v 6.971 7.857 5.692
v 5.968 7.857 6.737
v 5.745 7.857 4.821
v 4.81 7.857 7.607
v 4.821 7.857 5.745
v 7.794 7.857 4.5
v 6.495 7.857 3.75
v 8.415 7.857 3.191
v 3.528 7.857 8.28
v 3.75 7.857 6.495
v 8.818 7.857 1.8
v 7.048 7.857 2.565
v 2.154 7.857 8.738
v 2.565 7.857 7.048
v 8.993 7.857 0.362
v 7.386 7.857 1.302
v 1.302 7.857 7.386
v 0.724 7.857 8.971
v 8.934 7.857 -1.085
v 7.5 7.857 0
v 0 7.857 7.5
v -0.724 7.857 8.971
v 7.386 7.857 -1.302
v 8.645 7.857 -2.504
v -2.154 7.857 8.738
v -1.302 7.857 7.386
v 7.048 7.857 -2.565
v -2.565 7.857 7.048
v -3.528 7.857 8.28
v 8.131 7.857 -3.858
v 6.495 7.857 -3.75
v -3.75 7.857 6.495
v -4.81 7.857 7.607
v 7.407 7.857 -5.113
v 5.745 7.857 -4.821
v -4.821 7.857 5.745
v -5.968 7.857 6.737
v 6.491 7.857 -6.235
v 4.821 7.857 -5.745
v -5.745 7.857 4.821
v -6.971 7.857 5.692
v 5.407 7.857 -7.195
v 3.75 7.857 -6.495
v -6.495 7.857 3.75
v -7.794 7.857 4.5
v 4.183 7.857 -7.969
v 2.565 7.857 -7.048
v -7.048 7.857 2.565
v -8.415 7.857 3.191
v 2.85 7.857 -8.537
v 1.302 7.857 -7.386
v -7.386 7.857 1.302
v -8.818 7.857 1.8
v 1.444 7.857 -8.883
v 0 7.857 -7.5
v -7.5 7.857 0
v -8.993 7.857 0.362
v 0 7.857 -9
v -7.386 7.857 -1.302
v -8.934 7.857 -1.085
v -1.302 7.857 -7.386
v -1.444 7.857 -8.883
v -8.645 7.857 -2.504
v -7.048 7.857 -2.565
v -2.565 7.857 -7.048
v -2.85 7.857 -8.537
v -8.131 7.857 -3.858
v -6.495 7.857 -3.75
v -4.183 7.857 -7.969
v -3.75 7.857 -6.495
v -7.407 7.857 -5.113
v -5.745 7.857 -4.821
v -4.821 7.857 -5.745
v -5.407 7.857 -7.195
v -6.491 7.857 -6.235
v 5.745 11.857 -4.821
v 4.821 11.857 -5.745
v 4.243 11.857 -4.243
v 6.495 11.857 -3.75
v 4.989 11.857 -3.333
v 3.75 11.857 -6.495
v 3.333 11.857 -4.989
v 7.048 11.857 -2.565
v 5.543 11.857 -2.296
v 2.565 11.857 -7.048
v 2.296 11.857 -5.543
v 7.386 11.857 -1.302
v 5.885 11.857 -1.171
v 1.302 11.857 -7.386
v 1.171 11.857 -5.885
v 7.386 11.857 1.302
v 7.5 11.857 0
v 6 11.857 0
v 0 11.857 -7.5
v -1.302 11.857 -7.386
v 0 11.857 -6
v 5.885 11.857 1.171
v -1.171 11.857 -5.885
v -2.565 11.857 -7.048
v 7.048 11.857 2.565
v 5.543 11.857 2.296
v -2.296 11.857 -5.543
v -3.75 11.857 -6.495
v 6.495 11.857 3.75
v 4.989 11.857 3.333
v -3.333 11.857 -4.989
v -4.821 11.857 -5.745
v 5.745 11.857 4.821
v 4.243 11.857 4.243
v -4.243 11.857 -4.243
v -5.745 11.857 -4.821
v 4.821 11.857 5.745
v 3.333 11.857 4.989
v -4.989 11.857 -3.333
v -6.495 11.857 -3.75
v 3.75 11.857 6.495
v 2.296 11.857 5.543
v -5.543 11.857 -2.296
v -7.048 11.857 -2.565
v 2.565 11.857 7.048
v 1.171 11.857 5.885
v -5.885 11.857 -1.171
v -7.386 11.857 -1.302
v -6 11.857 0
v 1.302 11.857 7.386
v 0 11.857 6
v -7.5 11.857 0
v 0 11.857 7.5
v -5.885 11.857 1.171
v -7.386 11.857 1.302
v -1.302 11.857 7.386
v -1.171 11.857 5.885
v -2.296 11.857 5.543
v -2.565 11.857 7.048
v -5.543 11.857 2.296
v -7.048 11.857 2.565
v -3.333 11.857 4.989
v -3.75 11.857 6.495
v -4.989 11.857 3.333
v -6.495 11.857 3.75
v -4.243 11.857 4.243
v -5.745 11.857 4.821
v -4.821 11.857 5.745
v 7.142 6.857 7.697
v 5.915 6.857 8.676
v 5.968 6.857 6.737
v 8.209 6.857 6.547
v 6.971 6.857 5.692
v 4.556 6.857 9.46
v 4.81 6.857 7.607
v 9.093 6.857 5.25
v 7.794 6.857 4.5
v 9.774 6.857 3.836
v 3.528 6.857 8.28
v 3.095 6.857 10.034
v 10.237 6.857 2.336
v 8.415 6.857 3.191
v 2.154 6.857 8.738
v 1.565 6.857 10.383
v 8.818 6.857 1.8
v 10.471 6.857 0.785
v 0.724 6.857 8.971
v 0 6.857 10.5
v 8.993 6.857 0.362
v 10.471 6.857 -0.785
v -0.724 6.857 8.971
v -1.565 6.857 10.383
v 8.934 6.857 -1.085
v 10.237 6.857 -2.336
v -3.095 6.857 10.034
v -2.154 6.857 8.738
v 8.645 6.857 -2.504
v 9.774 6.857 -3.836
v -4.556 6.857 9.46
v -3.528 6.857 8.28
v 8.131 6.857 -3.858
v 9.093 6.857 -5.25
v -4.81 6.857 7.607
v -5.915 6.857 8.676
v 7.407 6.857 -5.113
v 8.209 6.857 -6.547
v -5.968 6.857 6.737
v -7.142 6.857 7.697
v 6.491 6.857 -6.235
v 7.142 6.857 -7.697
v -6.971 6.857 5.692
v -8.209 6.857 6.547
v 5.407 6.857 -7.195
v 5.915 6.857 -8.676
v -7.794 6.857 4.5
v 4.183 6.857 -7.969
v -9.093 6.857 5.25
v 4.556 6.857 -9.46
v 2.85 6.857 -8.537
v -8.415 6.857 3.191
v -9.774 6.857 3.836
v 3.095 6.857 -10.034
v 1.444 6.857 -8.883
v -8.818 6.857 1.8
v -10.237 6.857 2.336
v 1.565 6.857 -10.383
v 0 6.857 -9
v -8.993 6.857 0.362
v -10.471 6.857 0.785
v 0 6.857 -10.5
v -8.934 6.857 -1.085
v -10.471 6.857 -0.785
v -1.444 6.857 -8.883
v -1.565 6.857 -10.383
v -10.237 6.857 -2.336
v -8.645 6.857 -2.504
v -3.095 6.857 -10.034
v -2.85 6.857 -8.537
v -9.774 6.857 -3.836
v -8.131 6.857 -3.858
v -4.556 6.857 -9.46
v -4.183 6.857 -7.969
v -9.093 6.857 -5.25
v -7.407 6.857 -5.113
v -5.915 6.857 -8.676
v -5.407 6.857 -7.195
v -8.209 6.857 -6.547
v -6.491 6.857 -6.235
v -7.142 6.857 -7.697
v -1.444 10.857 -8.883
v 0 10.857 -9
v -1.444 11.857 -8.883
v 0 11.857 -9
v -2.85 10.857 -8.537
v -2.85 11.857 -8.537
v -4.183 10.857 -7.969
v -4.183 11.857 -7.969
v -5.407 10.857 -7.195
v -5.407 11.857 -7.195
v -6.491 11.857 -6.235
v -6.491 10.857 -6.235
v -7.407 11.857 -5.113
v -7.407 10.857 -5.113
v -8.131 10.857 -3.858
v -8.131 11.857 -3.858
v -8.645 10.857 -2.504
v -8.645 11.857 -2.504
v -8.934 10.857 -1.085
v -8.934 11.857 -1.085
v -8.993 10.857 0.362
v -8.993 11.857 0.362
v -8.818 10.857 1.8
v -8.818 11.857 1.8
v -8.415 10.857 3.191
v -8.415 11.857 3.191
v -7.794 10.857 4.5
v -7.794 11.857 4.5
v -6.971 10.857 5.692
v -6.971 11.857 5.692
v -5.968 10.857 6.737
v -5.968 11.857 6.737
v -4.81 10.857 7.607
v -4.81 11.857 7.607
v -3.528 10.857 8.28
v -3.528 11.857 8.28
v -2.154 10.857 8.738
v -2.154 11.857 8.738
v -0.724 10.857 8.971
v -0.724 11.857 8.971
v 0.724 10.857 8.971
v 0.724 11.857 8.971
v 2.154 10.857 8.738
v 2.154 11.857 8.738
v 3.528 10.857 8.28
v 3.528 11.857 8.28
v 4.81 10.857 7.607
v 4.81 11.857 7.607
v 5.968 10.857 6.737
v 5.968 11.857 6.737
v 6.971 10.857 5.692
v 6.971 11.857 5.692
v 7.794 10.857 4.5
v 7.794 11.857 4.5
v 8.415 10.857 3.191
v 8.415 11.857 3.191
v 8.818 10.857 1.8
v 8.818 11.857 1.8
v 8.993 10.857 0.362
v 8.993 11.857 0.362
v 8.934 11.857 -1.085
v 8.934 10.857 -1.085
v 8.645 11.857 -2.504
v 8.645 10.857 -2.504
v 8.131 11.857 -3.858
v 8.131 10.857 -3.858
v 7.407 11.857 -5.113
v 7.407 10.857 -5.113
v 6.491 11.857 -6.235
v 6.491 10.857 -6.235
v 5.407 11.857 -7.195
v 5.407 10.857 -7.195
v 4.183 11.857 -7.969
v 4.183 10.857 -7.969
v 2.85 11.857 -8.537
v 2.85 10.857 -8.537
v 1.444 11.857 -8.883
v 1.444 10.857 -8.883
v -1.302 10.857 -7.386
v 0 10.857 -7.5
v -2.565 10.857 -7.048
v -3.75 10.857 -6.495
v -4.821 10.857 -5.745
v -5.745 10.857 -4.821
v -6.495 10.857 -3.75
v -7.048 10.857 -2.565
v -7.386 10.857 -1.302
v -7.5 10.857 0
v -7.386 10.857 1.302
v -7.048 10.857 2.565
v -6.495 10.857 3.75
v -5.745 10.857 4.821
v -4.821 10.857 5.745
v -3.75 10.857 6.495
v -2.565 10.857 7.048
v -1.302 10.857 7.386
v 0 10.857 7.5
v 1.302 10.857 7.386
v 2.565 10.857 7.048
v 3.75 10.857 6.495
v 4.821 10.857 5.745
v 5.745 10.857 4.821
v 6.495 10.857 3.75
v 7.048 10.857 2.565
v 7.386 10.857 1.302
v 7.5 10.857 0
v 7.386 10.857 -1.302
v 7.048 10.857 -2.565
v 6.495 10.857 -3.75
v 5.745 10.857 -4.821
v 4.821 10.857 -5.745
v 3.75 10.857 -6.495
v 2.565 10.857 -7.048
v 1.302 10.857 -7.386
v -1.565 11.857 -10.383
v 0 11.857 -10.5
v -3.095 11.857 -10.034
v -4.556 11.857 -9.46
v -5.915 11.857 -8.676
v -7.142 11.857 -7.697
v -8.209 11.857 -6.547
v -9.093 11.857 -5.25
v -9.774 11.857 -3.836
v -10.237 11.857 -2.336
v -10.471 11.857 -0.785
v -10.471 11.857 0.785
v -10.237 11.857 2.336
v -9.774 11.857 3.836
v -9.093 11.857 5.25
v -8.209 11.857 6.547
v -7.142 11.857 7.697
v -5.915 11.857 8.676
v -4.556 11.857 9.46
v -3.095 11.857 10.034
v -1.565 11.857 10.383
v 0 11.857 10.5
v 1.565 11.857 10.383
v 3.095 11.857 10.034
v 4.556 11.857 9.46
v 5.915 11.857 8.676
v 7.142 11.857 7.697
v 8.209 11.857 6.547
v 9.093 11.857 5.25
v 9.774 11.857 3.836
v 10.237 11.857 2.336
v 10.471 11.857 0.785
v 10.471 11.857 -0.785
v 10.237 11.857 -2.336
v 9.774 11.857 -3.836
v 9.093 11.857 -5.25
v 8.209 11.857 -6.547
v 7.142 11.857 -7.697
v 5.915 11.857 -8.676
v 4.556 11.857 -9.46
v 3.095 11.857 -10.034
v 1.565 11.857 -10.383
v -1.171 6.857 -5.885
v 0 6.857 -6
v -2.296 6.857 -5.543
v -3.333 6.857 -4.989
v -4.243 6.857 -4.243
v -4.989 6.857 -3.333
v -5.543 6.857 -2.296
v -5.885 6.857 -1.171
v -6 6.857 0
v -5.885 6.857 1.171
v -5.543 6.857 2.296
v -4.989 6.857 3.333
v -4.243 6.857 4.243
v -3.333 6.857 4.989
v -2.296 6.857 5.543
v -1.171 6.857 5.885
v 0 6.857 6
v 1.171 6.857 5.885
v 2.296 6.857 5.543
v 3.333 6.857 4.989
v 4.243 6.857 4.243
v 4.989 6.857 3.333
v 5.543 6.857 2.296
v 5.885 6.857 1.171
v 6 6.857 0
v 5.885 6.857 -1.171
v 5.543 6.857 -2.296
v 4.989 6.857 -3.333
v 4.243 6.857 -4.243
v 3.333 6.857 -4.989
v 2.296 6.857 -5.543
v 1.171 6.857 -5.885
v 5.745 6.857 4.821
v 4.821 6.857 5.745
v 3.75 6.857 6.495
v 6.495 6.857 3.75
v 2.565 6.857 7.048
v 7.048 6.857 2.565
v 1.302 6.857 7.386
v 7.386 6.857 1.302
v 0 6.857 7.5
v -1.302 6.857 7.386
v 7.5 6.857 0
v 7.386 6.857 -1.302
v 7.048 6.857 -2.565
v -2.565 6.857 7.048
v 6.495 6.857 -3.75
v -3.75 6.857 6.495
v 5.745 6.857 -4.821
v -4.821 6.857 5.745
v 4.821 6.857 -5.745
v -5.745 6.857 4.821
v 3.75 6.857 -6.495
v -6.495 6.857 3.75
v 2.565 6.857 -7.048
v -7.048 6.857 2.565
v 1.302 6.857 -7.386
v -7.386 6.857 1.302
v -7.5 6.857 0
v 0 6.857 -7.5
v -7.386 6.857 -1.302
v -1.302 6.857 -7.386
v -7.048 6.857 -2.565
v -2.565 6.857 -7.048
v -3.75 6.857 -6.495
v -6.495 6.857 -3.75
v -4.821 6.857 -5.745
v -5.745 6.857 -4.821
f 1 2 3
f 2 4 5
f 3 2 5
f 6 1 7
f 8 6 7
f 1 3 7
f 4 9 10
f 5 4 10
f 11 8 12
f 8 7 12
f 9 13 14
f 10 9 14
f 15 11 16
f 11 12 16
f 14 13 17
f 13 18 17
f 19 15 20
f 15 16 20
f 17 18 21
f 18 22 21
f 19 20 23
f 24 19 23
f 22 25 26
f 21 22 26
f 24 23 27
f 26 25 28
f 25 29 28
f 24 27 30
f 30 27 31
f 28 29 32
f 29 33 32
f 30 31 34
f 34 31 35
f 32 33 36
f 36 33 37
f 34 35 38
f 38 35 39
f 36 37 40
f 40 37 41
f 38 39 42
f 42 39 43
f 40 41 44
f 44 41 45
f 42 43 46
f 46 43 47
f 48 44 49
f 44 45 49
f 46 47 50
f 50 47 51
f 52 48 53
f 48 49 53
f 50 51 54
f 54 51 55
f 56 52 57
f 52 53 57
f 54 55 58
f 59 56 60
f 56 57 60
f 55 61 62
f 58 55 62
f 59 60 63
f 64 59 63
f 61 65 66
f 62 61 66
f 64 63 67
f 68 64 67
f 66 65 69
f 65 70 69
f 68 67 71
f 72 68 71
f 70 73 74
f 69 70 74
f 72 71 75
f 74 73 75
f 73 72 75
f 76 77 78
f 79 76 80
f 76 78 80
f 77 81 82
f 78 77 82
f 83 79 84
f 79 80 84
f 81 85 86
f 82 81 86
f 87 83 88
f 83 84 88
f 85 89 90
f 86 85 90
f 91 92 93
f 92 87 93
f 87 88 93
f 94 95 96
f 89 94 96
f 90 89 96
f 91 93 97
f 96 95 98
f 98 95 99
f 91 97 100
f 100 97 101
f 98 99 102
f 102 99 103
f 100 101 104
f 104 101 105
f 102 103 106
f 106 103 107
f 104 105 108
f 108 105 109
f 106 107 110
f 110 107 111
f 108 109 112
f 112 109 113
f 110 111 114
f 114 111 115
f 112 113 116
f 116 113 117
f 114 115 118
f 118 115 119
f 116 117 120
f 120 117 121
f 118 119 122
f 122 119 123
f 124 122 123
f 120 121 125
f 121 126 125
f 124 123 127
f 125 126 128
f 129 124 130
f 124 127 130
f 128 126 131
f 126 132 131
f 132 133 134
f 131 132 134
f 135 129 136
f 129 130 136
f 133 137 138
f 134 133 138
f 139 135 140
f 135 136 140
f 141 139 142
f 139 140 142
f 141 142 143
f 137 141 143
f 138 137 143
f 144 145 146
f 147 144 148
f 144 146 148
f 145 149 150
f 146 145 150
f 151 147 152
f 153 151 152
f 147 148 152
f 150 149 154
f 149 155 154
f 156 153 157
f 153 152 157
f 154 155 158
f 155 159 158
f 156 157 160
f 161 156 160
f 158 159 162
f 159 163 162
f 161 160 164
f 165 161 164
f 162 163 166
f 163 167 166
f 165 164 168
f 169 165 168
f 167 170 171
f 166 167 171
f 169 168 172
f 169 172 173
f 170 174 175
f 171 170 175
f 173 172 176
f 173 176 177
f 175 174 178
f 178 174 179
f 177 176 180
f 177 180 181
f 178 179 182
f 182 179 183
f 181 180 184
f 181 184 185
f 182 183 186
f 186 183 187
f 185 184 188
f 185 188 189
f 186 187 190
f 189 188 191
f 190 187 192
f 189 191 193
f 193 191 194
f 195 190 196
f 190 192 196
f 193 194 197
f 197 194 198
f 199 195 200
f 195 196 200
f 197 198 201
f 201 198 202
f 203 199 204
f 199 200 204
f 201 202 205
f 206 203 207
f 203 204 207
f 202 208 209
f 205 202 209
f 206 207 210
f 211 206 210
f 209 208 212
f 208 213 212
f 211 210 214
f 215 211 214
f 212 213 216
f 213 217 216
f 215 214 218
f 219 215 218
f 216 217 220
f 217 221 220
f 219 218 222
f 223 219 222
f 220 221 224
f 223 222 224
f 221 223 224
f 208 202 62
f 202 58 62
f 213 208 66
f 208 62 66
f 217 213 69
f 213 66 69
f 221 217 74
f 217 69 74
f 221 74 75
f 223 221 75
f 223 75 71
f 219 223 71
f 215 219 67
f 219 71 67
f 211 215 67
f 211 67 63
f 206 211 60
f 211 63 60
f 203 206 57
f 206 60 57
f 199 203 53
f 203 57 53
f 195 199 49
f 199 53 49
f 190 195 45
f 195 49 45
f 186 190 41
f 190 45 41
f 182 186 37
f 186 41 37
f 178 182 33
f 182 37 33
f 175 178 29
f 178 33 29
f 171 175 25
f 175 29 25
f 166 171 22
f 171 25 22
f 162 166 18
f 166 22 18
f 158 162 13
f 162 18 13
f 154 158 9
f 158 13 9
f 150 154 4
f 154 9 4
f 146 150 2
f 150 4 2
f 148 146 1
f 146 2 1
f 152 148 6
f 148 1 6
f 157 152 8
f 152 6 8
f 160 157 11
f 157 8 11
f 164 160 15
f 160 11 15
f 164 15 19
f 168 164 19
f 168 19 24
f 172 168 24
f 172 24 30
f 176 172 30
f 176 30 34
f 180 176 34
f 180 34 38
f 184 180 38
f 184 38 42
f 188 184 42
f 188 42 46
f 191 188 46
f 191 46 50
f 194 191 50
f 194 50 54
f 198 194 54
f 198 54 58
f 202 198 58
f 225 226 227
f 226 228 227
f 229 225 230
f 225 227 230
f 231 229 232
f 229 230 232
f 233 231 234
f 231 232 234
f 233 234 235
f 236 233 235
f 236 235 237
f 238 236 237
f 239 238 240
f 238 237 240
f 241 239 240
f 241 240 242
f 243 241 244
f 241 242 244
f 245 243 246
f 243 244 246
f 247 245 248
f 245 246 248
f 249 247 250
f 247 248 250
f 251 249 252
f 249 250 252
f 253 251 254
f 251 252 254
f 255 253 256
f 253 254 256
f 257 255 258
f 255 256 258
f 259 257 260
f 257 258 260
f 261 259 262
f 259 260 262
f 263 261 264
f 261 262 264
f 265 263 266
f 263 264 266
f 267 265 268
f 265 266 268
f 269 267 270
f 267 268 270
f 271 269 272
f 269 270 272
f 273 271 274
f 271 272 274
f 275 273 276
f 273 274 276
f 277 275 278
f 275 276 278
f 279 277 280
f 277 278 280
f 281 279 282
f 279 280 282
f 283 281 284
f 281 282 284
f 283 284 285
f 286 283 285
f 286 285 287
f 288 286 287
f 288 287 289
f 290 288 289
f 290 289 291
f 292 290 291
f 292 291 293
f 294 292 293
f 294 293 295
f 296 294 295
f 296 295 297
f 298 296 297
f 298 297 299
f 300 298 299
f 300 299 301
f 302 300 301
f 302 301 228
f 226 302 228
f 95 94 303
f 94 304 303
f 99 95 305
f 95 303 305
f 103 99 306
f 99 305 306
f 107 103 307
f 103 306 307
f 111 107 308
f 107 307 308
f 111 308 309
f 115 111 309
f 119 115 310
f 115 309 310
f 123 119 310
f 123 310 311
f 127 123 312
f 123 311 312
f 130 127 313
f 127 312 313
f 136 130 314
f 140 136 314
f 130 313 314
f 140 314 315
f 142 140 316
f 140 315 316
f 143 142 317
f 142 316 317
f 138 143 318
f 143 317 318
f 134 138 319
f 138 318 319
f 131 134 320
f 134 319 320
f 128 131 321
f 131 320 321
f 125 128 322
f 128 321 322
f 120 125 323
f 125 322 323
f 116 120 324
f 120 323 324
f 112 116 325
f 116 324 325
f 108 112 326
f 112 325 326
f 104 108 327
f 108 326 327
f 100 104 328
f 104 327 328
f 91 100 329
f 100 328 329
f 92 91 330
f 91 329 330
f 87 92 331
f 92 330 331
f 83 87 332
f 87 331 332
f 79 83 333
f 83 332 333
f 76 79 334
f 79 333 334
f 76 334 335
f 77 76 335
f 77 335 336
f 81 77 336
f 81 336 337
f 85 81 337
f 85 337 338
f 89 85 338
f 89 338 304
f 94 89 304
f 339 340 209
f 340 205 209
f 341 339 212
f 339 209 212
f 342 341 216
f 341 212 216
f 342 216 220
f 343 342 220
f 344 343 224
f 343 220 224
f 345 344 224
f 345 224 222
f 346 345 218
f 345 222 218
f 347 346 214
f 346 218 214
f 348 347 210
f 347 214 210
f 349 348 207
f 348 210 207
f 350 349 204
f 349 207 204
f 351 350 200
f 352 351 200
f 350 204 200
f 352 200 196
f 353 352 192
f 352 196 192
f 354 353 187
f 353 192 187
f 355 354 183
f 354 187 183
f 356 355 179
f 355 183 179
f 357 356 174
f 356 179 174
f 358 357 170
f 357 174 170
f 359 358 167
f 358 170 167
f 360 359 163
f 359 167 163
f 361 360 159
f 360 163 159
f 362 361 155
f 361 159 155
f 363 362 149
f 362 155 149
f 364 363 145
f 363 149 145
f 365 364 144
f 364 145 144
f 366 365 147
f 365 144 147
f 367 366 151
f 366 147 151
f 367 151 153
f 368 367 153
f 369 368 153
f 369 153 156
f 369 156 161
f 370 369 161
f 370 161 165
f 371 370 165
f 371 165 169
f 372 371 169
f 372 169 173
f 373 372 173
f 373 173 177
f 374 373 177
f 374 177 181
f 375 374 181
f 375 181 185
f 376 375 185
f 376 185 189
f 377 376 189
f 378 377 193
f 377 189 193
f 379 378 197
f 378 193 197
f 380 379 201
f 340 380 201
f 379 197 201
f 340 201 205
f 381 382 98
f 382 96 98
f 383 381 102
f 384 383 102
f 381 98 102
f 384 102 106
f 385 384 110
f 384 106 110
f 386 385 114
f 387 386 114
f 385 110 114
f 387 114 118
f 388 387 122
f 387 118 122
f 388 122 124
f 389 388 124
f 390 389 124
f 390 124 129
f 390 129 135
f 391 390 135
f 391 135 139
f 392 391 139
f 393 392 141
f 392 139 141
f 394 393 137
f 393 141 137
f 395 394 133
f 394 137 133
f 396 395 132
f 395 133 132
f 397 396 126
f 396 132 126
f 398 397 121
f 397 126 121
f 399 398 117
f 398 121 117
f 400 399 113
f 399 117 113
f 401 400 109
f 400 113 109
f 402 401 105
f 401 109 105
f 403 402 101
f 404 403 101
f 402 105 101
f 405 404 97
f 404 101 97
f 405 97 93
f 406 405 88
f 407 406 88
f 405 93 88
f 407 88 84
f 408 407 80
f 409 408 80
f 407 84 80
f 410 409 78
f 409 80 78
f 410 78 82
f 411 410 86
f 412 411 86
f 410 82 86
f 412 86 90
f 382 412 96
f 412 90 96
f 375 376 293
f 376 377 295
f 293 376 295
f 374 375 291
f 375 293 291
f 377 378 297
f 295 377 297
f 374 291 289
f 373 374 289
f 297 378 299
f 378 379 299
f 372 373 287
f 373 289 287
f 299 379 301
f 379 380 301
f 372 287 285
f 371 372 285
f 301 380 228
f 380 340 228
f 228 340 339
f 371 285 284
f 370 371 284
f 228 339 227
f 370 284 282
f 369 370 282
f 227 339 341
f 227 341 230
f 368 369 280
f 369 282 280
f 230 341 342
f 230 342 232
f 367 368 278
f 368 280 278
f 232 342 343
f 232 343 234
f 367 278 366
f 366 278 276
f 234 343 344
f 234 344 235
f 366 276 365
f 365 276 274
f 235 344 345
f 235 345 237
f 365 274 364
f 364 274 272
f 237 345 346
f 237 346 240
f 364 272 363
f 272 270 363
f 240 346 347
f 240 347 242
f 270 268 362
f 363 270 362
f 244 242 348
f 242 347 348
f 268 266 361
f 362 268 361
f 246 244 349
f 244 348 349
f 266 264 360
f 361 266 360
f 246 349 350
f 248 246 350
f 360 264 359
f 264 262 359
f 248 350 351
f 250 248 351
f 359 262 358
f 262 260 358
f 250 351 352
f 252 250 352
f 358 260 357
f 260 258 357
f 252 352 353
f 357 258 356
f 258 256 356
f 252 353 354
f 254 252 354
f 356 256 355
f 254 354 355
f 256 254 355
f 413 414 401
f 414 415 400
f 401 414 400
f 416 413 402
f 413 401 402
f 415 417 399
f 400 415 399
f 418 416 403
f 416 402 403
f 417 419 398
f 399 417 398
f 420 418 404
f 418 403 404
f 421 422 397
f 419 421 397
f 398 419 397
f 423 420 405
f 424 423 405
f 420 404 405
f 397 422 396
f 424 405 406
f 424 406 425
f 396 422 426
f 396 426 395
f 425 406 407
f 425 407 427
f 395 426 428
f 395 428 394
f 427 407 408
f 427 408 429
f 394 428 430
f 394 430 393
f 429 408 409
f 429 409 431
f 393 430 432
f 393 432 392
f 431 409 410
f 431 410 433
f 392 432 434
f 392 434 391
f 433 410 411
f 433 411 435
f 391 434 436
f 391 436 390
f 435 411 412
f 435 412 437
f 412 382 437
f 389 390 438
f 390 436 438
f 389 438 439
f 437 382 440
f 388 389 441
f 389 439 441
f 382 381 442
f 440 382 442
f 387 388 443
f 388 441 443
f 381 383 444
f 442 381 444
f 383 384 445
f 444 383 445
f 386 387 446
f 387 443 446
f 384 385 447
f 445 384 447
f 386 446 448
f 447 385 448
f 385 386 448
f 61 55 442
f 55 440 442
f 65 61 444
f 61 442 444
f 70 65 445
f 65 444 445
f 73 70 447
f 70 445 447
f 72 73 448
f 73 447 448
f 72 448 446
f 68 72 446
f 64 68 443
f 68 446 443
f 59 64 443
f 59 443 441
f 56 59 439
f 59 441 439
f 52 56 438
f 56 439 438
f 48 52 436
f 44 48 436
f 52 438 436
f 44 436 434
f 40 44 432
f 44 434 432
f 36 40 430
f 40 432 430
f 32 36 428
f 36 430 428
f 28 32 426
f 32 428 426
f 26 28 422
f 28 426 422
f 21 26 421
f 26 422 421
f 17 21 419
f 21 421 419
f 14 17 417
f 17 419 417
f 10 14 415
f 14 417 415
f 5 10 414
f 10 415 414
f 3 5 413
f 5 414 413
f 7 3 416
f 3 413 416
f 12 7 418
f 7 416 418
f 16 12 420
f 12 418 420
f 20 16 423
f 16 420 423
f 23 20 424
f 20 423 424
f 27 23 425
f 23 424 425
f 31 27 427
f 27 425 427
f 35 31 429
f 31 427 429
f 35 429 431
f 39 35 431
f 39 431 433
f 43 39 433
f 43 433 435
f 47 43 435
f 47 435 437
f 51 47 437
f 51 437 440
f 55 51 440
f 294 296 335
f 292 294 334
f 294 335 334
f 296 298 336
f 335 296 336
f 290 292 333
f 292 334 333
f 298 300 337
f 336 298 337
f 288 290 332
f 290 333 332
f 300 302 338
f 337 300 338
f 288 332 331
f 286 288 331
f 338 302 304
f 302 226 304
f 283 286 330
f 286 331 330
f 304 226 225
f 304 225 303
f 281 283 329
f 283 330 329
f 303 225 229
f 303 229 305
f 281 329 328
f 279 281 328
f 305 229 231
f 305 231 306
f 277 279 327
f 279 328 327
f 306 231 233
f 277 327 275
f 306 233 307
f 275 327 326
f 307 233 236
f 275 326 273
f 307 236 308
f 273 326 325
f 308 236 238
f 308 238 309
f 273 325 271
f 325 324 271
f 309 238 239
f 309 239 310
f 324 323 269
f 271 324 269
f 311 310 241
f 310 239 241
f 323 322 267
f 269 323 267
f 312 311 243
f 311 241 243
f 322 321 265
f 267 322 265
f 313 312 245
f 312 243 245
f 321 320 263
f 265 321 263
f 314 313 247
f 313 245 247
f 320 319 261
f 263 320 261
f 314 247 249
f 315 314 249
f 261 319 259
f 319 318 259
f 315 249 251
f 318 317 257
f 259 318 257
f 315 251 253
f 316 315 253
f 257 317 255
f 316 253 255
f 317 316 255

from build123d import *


with BuildPart() as part:
    # Croquis1 → Revolución1 (revolve)
    with BuildSketch(Plane.XY, mode=Mode.PRIVATE) as revoluci_n1_sk:
        Polygon((-6, 6.856705357), (-6, 11.856705357), (-7.5, 11.856705357), (-7.5, 10.856705357), (-9, 10.856705357), (-9, 11.856705357), (-10.5, 11.856705357), (-10.5, 6.856705357), (-9, 6.856705357), (-9, 7.856705357), (-7.5, 7.856705357), (-7.5, 6.856705357), align=None)
    revolve(revoluci_n1_sk.sketch.rotate(Axis((0, 0, 0), (0, 1, 0)), 270), axis=Axis((0, 0, 0), (0, 1, 0)))


solid = part.part
